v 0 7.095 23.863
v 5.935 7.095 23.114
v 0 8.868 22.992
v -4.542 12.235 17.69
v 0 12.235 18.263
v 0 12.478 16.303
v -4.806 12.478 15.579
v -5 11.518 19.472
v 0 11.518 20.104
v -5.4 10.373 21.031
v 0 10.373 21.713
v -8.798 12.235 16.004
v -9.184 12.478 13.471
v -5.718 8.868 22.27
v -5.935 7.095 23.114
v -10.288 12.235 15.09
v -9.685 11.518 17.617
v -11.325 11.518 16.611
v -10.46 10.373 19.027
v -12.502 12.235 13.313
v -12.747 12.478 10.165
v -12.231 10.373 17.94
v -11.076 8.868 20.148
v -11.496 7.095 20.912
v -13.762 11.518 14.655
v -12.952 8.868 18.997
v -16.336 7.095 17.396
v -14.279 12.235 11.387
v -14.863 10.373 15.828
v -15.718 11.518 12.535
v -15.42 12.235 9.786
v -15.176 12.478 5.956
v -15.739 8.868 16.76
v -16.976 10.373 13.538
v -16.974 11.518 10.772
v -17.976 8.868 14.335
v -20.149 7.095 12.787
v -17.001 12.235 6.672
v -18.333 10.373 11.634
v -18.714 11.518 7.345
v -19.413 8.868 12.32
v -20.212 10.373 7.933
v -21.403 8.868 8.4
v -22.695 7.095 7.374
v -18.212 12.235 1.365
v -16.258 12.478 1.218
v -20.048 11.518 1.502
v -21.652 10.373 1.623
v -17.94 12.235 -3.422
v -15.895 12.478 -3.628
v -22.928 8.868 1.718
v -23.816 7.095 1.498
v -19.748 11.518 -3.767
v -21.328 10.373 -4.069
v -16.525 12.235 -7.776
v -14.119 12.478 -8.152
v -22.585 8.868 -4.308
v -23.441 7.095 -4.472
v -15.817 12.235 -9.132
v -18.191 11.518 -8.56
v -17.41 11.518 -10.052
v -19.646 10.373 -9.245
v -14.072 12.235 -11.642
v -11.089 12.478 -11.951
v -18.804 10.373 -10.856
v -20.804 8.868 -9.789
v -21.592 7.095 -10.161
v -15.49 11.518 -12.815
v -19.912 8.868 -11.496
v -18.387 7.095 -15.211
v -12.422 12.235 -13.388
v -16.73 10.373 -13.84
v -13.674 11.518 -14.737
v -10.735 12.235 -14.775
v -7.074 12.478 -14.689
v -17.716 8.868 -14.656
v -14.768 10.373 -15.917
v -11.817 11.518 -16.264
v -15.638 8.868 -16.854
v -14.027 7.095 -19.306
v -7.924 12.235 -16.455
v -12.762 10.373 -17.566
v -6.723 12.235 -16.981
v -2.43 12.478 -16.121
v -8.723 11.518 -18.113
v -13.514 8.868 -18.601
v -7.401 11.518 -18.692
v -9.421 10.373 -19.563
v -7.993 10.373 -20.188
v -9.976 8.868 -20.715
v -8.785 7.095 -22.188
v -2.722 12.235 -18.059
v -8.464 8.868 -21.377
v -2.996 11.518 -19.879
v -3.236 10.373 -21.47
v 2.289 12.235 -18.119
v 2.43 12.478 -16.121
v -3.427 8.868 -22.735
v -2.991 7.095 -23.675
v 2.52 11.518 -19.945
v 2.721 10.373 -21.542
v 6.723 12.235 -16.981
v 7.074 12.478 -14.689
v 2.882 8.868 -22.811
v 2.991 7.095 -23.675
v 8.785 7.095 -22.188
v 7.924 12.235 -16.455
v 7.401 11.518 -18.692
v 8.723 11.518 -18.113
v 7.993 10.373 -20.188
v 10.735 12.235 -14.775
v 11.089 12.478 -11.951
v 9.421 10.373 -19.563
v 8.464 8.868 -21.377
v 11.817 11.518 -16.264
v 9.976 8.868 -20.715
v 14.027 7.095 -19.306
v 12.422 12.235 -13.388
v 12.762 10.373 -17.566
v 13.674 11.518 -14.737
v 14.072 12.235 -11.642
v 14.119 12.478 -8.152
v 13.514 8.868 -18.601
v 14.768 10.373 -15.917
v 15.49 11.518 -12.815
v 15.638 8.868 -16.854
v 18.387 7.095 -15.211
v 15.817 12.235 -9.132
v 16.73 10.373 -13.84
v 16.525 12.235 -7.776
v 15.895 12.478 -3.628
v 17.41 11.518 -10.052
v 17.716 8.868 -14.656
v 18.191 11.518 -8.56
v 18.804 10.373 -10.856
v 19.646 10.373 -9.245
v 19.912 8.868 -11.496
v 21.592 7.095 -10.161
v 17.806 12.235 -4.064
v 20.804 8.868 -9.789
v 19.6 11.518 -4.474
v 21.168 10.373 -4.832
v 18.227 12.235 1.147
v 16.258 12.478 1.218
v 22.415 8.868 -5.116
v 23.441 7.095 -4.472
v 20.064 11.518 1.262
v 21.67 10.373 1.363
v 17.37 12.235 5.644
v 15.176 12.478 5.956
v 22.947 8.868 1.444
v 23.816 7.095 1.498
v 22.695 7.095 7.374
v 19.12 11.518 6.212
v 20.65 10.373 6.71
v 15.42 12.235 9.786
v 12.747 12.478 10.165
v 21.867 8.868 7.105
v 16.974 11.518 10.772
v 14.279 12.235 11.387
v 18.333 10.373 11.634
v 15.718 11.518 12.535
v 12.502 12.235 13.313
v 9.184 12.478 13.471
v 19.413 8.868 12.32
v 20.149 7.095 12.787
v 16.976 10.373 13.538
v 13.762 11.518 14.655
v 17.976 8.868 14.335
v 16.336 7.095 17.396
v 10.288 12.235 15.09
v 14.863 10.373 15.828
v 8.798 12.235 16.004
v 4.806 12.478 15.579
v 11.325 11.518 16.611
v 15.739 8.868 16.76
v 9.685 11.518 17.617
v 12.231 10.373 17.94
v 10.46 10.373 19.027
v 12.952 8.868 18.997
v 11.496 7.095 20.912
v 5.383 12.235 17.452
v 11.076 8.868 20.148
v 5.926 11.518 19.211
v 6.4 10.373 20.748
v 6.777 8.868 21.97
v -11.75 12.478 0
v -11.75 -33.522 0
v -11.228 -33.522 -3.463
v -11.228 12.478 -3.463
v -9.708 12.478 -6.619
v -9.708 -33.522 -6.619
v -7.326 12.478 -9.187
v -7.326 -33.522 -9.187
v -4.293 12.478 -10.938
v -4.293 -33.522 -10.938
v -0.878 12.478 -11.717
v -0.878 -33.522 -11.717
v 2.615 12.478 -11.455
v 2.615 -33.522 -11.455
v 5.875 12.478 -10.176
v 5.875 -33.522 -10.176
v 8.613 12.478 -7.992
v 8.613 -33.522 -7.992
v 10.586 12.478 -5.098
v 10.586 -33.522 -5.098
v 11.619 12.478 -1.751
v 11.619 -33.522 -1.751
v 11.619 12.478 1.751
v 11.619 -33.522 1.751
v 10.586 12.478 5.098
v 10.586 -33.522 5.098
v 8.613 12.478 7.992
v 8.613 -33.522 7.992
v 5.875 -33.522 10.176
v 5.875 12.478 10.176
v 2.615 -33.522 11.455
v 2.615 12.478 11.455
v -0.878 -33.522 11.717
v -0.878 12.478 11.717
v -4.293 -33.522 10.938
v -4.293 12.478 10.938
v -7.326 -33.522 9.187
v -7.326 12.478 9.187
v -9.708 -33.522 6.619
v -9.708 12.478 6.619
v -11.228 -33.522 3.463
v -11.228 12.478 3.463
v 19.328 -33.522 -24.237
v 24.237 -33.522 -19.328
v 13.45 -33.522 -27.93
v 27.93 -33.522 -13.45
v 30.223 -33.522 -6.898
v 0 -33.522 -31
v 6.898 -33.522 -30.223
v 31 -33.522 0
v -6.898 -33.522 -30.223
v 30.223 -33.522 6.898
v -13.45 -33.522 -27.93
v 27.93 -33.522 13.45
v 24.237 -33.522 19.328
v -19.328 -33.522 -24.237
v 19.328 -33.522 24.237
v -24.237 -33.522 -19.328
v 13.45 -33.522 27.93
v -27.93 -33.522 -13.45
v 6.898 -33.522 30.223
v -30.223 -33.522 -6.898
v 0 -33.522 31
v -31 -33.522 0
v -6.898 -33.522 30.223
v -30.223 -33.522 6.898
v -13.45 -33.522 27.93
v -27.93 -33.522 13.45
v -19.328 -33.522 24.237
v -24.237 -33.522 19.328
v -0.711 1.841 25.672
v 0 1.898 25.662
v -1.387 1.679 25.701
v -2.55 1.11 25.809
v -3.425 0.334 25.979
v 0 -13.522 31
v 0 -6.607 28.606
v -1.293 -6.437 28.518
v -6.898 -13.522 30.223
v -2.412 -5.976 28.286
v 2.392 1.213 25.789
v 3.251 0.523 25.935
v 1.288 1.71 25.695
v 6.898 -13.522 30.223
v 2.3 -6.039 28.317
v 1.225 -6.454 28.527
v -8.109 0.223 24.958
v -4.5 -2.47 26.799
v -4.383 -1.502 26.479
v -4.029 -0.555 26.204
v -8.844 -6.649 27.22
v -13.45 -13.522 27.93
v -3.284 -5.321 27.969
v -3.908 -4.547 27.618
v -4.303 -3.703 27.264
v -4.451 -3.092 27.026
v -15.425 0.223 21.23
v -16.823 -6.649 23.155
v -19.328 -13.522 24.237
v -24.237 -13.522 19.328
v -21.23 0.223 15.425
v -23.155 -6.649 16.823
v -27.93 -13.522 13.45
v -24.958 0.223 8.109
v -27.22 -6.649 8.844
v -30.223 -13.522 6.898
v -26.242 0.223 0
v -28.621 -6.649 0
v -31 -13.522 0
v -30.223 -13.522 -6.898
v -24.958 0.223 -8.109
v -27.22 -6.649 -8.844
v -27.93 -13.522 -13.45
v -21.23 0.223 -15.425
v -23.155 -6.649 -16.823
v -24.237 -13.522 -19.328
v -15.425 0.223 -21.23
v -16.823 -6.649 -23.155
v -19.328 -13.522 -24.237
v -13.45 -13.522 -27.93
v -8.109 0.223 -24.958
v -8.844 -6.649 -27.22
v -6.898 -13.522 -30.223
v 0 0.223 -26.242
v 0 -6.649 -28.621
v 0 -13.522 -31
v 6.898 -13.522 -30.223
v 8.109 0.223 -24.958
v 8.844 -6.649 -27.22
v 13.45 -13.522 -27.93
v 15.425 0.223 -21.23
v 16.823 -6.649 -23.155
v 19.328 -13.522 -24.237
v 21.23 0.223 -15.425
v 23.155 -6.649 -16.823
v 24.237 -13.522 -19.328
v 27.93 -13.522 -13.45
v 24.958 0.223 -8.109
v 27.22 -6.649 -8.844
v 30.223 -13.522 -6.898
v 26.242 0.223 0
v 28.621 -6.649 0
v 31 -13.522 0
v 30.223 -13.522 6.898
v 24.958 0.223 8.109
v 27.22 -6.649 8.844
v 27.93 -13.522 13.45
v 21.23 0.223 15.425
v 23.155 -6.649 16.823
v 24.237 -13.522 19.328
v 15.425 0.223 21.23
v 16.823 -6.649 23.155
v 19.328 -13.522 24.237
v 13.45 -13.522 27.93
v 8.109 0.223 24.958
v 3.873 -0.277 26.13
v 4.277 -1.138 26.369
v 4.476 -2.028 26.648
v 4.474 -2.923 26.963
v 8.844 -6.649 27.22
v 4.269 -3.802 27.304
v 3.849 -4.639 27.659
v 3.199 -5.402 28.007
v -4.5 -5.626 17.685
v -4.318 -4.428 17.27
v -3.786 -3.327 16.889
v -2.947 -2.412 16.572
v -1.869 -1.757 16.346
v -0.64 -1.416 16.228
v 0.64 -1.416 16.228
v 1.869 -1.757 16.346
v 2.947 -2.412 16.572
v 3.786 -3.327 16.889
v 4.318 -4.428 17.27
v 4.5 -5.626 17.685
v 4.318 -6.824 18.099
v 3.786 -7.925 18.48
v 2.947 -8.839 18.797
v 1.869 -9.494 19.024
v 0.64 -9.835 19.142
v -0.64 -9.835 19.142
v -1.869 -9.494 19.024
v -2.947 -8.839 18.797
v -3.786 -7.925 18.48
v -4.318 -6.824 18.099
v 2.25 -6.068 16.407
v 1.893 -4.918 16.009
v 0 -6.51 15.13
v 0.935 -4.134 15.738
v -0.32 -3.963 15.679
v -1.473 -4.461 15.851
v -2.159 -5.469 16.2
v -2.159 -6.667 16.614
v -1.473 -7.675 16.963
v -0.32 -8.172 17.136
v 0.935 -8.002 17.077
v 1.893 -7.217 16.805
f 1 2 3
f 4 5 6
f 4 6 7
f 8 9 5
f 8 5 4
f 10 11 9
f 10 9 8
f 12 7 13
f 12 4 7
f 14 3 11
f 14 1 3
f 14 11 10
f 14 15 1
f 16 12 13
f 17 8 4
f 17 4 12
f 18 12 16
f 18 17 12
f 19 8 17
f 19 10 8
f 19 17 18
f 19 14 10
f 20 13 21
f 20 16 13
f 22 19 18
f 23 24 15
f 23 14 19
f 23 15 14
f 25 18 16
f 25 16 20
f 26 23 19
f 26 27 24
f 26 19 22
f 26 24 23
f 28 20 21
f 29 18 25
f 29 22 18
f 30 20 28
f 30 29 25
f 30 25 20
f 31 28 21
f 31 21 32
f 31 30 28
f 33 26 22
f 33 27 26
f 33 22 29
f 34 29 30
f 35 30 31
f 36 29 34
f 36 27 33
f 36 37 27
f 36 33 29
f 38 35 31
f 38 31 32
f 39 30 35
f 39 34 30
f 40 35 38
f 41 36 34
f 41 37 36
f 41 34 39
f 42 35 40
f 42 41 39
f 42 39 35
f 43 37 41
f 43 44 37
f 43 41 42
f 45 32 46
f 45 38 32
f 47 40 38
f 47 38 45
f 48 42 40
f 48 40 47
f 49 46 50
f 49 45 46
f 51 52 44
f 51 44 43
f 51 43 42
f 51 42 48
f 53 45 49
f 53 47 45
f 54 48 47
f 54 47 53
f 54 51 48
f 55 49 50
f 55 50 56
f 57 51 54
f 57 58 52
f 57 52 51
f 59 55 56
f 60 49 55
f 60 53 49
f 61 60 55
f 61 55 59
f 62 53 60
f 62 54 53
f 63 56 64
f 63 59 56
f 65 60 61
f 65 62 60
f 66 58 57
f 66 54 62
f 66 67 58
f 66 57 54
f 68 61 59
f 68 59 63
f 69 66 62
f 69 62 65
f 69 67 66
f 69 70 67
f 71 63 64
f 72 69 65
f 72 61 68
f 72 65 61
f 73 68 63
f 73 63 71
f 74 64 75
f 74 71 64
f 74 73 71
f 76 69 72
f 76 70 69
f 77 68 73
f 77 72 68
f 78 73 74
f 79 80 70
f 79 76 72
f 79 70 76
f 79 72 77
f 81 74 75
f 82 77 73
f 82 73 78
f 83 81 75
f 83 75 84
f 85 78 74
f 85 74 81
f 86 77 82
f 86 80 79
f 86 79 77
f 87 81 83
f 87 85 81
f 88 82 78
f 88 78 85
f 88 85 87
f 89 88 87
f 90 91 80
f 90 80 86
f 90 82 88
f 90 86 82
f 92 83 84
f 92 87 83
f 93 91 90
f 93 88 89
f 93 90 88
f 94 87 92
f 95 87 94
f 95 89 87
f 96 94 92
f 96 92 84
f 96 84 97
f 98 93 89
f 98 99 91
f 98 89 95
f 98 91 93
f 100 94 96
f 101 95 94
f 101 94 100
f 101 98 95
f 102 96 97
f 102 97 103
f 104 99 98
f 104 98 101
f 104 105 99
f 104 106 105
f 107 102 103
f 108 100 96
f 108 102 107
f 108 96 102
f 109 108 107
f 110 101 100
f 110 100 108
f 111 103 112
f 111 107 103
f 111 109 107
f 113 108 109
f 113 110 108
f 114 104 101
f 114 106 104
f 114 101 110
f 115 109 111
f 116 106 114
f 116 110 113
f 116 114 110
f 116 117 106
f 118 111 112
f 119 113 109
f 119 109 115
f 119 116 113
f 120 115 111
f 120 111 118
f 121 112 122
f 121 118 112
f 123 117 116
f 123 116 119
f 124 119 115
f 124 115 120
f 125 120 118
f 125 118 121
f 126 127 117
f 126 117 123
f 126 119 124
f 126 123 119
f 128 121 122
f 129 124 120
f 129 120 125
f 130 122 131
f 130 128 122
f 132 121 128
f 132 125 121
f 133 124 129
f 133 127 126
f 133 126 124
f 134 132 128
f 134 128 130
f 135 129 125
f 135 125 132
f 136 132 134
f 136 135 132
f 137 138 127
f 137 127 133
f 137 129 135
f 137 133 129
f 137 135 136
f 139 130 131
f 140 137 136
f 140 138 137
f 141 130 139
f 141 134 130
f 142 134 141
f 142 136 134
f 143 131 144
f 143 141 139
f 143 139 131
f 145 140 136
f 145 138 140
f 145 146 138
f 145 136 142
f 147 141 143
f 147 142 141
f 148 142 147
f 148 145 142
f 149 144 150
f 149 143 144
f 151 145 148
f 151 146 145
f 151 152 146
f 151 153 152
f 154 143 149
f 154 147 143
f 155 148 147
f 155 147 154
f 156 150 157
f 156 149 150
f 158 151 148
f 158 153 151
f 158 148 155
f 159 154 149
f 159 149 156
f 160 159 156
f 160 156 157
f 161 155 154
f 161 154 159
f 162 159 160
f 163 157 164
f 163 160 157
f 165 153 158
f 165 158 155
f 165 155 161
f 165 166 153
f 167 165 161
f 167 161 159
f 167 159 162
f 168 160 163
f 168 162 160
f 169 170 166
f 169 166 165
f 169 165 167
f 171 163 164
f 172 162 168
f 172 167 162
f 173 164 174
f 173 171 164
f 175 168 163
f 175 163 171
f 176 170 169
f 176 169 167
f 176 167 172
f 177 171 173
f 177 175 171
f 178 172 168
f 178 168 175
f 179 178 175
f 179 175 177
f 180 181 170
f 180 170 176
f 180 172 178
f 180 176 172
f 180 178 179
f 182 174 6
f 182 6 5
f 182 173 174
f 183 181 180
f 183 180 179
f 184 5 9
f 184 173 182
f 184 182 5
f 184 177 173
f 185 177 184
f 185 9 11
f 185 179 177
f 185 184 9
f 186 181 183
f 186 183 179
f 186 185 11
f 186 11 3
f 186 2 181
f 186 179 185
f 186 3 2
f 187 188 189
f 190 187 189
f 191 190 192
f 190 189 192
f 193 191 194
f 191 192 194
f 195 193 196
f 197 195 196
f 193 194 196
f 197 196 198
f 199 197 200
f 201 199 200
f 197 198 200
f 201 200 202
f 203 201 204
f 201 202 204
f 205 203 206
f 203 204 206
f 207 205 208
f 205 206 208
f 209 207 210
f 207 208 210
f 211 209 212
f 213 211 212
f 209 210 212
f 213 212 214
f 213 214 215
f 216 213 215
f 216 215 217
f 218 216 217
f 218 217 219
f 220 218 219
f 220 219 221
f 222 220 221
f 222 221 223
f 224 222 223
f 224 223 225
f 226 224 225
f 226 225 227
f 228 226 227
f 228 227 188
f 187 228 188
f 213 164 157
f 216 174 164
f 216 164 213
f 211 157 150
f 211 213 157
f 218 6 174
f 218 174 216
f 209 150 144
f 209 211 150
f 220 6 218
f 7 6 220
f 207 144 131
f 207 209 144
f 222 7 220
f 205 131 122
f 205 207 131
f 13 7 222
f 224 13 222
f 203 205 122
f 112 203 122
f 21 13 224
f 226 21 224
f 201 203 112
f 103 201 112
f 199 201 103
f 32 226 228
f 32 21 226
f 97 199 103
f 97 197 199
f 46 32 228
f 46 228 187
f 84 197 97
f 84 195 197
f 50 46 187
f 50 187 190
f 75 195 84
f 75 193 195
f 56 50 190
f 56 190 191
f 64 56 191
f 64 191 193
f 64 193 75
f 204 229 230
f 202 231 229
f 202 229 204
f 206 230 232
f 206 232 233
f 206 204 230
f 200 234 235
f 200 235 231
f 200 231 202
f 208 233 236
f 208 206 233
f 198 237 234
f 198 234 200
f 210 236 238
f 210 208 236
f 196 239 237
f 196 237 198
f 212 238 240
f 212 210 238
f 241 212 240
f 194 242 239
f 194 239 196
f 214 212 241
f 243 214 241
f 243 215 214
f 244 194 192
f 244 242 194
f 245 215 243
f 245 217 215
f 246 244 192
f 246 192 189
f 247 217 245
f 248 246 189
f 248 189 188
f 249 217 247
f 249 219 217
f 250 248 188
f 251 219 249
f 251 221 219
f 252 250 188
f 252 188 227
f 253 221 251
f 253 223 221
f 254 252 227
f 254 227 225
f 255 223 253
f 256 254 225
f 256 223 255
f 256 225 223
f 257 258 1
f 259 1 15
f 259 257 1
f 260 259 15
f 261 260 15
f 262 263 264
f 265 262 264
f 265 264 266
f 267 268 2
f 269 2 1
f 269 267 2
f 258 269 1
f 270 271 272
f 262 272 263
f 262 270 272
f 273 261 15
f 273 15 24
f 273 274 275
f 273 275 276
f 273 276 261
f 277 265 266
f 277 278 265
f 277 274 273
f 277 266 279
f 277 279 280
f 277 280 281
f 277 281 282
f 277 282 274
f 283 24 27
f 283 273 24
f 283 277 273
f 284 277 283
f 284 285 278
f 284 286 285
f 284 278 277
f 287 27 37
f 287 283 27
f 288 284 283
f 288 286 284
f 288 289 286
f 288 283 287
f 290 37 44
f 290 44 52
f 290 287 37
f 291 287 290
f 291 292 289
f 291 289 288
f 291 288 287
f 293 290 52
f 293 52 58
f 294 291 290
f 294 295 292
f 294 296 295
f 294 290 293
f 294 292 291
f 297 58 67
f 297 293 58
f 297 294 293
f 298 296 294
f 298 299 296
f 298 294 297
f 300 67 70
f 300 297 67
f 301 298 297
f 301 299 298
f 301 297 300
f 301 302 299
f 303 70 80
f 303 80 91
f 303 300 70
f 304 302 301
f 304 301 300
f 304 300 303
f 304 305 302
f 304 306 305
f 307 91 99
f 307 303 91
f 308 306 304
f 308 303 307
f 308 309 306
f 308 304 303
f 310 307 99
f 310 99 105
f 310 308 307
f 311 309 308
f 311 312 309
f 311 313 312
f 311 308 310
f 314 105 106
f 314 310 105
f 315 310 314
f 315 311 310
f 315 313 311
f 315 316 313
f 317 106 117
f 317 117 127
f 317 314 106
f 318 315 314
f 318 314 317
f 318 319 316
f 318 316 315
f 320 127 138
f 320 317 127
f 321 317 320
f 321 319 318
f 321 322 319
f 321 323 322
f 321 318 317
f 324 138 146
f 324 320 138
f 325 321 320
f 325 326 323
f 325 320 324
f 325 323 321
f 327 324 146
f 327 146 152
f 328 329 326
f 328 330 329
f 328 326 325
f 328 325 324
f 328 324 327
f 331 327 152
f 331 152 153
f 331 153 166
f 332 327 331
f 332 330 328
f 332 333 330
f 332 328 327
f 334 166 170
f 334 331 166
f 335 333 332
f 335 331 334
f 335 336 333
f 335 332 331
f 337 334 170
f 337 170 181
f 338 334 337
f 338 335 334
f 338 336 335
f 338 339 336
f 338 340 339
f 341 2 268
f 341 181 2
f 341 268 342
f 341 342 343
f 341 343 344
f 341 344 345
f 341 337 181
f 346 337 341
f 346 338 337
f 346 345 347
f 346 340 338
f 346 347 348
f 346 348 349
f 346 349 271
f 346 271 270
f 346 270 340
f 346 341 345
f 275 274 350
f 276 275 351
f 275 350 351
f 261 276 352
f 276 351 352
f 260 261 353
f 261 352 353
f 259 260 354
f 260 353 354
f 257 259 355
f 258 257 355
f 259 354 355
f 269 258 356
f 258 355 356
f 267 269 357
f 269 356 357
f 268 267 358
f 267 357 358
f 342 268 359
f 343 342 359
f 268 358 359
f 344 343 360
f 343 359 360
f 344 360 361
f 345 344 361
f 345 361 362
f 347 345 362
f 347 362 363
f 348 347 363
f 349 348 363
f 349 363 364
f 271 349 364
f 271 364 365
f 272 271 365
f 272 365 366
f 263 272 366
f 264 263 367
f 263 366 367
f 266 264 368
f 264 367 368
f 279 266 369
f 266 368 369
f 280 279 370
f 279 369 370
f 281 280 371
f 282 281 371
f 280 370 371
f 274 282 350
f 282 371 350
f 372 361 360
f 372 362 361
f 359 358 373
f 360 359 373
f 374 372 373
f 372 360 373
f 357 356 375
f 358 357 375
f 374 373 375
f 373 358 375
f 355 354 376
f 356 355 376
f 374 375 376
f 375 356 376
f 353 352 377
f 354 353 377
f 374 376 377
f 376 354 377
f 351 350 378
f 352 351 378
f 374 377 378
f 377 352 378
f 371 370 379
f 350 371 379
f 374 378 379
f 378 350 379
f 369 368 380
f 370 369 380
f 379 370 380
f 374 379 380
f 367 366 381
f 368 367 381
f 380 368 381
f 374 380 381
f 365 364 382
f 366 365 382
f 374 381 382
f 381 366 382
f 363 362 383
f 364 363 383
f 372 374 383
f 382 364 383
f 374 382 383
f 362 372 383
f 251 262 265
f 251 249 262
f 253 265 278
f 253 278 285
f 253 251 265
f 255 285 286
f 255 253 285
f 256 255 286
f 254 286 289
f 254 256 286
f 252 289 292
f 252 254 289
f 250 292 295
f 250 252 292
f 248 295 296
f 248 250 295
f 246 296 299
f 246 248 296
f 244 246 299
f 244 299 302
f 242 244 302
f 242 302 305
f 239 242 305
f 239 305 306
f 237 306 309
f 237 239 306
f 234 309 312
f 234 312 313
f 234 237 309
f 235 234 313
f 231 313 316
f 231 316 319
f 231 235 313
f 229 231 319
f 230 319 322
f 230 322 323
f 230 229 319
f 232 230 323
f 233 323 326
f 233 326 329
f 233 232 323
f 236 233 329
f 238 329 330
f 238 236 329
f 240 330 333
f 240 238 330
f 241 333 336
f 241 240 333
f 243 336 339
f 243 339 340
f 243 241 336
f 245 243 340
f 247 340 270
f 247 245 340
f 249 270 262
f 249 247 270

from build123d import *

# Parameters (mm, degrees)
M25X1_5_TAPPED_HOLE2_D     = 23.5
FILLET1_R                  = 8
M10X1_0_TAPPED_HOLE1_D     = 9
M10X1_0_TAPPED_HOLE1_DEPTH = 10
M10X1_0_TAPPED_HOLE1_TIP   = 2.703872786


with BuildPart() as part:
    # Sketch1 → Revolve1 (revolve)
    with BuildSketch(Plane.XY, mode=Mode.PRIVATE) as revolve1_sk:
        Polygon((0, 12.478494624), (22, 12.478494624), (31, -13.521505376), (31, -33.521505376), (0, -33.521505376), align=None)
    revolve(revolve1_sk.sketch.rotate(Axis((0, 17.682795699, 0), (0, -1, 0)), 90), axis=Axis((0, 17.682795699, 0), (0, -1, 0)))

    # M25x1.5 Tapped Hole2 (through all)
    with Locations(Plane(origin=(0, 12.478494624, 0), x_dir=(1, 0, 0), z_dir=(0, 1, 0))):
        with Locations((0, 0)):
            Hole(M25X1_5_TAPPED_HOLE2_D / 2)

    # Fillet1
    fillet1_edges = [part.edges().sort_by_distance(p)[0] for p in [
        (0, 12.478494624, -22),
    ]]
    fillet(fillet1_edges, radius=FILLET1_R)

    # M10x1.0 Tapped Hole1
    with Locations(Plane(origin=(0, 8.13574381, 23.503259897), x_dir=(1, 0, 0), z_dir=(0, 0.32711056388316645, 0.9449860734402581))):
        with Locations((0, -11.100931225)):
            Hole(M10X1_0_TAPPED_HOLE1_D / 2, depth=M10X1_0_TAPPED_HOLE1_DEPTH)
            with Locations((0, 0, -(M10X1_0_TAPPED_HOLE1_DEPTH + M10X1_0_TAPPED_HOLE1_TIP / 2))):  # 118° drill point
                Cone(0, M10X1_0_TAPPED_HOLE1_D / 2, M10X1_0_TAPPED_HOLE1_TIP, mode=Mode.SUBTRACT)


solid = part.part
